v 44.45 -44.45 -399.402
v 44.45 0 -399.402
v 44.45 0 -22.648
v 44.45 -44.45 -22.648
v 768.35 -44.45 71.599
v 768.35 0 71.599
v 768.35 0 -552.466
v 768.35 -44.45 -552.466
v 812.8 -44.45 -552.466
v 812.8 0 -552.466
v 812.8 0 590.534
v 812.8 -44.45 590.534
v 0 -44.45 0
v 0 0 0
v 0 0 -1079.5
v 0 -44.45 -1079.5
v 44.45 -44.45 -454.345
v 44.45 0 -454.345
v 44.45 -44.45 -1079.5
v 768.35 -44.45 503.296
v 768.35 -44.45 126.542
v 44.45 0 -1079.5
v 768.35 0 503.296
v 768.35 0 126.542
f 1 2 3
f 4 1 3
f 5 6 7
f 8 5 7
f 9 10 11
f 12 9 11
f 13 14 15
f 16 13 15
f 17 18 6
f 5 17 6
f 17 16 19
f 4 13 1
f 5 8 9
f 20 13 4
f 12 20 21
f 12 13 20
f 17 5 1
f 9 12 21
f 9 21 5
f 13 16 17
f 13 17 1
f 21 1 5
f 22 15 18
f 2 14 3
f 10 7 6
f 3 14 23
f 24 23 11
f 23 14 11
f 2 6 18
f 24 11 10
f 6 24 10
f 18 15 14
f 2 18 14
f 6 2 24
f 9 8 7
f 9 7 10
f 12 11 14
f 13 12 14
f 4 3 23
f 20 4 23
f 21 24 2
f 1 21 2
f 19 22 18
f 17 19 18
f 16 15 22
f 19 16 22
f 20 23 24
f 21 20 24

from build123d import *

# Parameters (mm, degrees)
F1_DEPTH = 44.45


with BuildPart() as f1:
    # F0 (on Front) → F1 (new body)
    with BuildSketch(Plane.XZ):
        Polygon((44.45, -399.401926), (44.45, -454.345147), (768.35, 71.598989), (768.35, 126.54221), align=None)
        Polygon((812.8, 590.533767), (0, 0), (0, -1079.5), (44.45, -1079.5), (44.45, -454.345147), (44.45, -399.401926), (44.45, -22.648406), (768.35, 503.29573), (768.35, 126.54221), (768.35, 71.598989), (768.35, -552.466233), (812.8, -552.466233), align=None)
    extrude(amount=F1_DEPTH)


solid = f1.part
